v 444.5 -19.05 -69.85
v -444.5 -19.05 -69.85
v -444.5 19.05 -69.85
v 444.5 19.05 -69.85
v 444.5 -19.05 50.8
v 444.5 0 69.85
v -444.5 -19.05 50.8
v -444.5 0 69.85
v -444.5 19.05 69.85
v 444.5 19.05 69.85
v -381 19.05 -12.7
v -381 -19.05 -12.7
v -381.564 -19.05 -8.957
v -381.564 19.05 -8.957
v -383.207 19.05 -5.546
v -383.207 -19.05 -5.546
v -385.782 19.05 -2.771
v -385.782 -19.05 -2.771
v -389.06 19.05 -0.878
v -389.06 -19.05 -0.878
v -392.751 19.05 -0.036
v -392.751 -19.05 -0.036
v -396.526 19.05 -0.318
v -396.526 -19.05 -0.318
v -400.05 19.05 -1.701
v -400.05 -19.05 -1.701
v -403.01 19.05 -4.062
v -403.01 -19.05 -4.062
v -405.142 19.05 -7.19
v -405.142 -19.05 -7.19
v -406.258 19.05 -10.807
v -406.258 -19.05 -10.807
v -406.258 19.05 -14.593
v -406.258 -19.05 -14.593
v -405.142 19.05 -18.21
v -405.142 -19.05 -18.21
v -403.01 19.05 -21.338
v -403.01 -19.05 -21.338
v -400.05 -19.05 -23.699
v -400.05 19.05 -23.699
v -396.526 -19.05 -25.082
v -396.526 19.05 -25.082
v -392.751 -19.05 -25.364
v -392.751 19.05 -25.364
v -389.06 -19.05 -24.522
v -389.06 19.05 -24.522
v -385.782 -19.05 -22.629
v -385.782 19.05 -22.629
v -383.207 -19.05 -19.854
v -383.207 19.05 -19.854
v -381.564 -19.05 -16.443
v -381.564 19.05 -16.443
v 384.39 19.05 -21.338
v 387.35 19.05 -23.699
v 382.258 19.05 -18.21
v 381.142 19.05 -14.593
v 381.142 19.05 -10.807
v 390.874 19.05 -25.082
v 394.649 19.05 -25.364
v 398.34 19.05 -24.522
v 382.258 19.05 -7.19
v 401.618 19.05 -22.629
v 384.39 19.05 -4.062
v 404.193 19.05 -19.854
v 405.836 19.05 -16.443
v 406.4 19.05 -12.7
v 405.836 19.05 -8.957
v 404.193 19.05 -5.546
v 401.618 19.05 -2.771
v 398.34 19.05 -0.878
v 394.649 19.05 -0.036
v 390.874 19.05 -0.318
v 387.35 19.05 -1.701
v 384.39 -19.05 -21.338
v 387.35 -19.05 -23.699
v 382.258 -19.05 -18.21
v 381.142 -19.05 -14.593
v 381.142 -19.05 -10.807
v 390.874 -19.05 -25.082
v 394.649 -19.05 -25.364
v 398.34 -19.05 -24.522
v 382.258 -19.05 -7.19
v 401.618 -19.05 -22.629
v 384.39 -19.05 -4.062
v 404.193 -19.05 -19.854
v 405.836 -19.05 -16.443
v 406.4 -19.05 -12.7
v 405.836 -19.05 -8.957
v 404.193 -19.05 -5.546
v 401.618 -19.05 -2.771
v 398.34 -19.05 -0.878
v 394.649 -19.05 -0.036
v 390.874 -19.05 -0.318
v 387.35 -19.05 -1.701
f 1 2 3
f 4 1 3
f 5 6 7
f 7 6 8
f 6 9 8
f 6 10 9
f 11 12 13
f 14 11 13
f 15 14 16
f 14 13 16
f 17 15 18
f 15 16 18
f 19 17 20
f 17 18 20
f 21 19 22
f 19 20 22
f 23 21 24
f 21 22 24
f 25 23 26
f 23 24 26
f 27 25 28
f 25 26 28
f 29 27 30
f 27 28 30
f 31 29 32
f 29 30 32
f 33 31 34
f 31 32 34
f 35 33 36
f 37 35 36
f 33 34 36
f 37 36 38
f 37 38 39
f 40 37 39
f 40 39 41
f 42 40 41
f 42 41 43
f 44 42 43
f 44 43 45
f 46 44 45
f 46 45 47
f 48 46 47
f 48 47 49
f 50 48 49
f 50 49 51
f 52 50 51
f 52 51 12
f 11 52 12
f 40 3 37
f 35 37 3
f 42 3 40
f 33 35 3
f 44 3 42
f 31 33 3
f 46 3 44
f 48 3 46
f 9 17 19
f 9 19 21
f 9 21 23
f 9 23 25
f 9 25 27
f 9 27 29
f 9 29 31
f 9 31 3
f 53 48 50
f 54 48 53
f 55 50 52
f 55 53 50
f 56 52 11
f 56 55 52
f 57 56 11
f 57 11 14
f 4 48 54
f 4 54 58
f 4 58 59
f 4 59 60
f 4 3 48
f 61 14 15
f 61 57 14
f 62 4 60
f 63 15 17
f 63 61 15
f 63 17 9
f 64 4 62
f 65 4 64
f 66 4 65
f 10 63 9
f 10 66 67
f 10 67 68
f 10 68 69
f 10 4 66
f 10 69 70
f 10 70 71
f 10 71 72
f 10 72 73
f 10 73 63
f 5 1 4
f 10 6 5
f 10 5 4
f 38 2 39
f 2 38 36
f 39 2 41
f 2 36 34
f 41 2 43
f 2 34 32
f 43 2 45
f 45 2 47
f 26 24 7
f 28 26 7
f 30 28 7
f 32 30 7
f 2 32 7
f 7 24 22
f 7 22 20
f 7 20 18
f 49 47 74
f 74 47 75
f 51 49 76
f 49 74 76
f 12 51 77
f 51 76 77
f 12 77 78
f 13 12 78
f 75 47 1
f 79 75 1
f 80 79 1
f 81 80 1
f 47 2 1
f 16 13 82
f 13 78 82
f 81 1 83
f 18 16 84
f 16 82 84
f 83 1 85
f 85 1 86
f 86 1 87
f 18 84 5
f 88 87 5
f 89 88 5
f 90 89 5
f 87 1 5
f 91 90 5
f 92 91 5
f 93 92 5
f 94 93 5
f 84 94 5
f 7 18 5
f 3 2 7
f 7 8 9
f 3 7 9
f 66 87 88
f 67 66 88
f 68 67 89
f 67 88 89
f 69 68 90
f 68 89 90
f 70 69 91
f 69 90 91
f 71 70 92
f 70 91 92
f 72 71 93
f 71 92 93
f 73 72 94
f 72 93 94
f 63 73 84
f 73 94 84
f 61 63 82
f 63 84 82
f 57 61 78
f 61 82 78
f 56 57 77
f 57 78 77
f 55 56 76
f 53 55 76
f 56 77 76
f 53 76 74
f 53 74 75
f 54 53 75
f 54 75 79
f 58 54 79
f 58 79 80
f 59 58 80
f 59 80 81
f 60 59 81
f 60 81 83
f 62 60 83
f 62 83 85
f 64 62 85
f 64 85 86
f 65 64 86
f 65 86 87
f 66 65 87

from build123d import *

# Parameters (mm, degrees)
F0_W     = 19.05
F0_H     = 139.7
F1_DEPTH = 444.5
F2_SIZE  = 19.05
F3_R     = 12.7
F4_DEPTH = 38.101


with BuildPart() as f1:
    # F0 (on Right) → F1 (new body, symmetric)
    with BuildSketch(Plane.YZ):
        with Locations((-9.525, 0)):
            Rectangle(F0_W, F0_H)
        with Locations((9.525, 0)):
            Rectangle(F0_W, F0_H)
    extrude(amount=F1_DEPTH, both=True)

    # F2
    f2_edges = [f1.edges().sort_by_distance(p)[0] for p in [
        (0, -19.05, 69.85),
    ]]
    chamfer(f2_edges, length=F2_SIZE)

    # F3 (on face) → F4 (cut, through all)
    with BuildSketch(Plane.XZ.offset(19.05)):
        with Locations((-393.7, -12.7)):
            Circle(F3_R)
        with Locations((393.7, -12.7)):
            Circle(F3_R)
    extrude(amount=-F4_DEPTH, mode=Mode.SUBTRACT)


solid = f1.part
